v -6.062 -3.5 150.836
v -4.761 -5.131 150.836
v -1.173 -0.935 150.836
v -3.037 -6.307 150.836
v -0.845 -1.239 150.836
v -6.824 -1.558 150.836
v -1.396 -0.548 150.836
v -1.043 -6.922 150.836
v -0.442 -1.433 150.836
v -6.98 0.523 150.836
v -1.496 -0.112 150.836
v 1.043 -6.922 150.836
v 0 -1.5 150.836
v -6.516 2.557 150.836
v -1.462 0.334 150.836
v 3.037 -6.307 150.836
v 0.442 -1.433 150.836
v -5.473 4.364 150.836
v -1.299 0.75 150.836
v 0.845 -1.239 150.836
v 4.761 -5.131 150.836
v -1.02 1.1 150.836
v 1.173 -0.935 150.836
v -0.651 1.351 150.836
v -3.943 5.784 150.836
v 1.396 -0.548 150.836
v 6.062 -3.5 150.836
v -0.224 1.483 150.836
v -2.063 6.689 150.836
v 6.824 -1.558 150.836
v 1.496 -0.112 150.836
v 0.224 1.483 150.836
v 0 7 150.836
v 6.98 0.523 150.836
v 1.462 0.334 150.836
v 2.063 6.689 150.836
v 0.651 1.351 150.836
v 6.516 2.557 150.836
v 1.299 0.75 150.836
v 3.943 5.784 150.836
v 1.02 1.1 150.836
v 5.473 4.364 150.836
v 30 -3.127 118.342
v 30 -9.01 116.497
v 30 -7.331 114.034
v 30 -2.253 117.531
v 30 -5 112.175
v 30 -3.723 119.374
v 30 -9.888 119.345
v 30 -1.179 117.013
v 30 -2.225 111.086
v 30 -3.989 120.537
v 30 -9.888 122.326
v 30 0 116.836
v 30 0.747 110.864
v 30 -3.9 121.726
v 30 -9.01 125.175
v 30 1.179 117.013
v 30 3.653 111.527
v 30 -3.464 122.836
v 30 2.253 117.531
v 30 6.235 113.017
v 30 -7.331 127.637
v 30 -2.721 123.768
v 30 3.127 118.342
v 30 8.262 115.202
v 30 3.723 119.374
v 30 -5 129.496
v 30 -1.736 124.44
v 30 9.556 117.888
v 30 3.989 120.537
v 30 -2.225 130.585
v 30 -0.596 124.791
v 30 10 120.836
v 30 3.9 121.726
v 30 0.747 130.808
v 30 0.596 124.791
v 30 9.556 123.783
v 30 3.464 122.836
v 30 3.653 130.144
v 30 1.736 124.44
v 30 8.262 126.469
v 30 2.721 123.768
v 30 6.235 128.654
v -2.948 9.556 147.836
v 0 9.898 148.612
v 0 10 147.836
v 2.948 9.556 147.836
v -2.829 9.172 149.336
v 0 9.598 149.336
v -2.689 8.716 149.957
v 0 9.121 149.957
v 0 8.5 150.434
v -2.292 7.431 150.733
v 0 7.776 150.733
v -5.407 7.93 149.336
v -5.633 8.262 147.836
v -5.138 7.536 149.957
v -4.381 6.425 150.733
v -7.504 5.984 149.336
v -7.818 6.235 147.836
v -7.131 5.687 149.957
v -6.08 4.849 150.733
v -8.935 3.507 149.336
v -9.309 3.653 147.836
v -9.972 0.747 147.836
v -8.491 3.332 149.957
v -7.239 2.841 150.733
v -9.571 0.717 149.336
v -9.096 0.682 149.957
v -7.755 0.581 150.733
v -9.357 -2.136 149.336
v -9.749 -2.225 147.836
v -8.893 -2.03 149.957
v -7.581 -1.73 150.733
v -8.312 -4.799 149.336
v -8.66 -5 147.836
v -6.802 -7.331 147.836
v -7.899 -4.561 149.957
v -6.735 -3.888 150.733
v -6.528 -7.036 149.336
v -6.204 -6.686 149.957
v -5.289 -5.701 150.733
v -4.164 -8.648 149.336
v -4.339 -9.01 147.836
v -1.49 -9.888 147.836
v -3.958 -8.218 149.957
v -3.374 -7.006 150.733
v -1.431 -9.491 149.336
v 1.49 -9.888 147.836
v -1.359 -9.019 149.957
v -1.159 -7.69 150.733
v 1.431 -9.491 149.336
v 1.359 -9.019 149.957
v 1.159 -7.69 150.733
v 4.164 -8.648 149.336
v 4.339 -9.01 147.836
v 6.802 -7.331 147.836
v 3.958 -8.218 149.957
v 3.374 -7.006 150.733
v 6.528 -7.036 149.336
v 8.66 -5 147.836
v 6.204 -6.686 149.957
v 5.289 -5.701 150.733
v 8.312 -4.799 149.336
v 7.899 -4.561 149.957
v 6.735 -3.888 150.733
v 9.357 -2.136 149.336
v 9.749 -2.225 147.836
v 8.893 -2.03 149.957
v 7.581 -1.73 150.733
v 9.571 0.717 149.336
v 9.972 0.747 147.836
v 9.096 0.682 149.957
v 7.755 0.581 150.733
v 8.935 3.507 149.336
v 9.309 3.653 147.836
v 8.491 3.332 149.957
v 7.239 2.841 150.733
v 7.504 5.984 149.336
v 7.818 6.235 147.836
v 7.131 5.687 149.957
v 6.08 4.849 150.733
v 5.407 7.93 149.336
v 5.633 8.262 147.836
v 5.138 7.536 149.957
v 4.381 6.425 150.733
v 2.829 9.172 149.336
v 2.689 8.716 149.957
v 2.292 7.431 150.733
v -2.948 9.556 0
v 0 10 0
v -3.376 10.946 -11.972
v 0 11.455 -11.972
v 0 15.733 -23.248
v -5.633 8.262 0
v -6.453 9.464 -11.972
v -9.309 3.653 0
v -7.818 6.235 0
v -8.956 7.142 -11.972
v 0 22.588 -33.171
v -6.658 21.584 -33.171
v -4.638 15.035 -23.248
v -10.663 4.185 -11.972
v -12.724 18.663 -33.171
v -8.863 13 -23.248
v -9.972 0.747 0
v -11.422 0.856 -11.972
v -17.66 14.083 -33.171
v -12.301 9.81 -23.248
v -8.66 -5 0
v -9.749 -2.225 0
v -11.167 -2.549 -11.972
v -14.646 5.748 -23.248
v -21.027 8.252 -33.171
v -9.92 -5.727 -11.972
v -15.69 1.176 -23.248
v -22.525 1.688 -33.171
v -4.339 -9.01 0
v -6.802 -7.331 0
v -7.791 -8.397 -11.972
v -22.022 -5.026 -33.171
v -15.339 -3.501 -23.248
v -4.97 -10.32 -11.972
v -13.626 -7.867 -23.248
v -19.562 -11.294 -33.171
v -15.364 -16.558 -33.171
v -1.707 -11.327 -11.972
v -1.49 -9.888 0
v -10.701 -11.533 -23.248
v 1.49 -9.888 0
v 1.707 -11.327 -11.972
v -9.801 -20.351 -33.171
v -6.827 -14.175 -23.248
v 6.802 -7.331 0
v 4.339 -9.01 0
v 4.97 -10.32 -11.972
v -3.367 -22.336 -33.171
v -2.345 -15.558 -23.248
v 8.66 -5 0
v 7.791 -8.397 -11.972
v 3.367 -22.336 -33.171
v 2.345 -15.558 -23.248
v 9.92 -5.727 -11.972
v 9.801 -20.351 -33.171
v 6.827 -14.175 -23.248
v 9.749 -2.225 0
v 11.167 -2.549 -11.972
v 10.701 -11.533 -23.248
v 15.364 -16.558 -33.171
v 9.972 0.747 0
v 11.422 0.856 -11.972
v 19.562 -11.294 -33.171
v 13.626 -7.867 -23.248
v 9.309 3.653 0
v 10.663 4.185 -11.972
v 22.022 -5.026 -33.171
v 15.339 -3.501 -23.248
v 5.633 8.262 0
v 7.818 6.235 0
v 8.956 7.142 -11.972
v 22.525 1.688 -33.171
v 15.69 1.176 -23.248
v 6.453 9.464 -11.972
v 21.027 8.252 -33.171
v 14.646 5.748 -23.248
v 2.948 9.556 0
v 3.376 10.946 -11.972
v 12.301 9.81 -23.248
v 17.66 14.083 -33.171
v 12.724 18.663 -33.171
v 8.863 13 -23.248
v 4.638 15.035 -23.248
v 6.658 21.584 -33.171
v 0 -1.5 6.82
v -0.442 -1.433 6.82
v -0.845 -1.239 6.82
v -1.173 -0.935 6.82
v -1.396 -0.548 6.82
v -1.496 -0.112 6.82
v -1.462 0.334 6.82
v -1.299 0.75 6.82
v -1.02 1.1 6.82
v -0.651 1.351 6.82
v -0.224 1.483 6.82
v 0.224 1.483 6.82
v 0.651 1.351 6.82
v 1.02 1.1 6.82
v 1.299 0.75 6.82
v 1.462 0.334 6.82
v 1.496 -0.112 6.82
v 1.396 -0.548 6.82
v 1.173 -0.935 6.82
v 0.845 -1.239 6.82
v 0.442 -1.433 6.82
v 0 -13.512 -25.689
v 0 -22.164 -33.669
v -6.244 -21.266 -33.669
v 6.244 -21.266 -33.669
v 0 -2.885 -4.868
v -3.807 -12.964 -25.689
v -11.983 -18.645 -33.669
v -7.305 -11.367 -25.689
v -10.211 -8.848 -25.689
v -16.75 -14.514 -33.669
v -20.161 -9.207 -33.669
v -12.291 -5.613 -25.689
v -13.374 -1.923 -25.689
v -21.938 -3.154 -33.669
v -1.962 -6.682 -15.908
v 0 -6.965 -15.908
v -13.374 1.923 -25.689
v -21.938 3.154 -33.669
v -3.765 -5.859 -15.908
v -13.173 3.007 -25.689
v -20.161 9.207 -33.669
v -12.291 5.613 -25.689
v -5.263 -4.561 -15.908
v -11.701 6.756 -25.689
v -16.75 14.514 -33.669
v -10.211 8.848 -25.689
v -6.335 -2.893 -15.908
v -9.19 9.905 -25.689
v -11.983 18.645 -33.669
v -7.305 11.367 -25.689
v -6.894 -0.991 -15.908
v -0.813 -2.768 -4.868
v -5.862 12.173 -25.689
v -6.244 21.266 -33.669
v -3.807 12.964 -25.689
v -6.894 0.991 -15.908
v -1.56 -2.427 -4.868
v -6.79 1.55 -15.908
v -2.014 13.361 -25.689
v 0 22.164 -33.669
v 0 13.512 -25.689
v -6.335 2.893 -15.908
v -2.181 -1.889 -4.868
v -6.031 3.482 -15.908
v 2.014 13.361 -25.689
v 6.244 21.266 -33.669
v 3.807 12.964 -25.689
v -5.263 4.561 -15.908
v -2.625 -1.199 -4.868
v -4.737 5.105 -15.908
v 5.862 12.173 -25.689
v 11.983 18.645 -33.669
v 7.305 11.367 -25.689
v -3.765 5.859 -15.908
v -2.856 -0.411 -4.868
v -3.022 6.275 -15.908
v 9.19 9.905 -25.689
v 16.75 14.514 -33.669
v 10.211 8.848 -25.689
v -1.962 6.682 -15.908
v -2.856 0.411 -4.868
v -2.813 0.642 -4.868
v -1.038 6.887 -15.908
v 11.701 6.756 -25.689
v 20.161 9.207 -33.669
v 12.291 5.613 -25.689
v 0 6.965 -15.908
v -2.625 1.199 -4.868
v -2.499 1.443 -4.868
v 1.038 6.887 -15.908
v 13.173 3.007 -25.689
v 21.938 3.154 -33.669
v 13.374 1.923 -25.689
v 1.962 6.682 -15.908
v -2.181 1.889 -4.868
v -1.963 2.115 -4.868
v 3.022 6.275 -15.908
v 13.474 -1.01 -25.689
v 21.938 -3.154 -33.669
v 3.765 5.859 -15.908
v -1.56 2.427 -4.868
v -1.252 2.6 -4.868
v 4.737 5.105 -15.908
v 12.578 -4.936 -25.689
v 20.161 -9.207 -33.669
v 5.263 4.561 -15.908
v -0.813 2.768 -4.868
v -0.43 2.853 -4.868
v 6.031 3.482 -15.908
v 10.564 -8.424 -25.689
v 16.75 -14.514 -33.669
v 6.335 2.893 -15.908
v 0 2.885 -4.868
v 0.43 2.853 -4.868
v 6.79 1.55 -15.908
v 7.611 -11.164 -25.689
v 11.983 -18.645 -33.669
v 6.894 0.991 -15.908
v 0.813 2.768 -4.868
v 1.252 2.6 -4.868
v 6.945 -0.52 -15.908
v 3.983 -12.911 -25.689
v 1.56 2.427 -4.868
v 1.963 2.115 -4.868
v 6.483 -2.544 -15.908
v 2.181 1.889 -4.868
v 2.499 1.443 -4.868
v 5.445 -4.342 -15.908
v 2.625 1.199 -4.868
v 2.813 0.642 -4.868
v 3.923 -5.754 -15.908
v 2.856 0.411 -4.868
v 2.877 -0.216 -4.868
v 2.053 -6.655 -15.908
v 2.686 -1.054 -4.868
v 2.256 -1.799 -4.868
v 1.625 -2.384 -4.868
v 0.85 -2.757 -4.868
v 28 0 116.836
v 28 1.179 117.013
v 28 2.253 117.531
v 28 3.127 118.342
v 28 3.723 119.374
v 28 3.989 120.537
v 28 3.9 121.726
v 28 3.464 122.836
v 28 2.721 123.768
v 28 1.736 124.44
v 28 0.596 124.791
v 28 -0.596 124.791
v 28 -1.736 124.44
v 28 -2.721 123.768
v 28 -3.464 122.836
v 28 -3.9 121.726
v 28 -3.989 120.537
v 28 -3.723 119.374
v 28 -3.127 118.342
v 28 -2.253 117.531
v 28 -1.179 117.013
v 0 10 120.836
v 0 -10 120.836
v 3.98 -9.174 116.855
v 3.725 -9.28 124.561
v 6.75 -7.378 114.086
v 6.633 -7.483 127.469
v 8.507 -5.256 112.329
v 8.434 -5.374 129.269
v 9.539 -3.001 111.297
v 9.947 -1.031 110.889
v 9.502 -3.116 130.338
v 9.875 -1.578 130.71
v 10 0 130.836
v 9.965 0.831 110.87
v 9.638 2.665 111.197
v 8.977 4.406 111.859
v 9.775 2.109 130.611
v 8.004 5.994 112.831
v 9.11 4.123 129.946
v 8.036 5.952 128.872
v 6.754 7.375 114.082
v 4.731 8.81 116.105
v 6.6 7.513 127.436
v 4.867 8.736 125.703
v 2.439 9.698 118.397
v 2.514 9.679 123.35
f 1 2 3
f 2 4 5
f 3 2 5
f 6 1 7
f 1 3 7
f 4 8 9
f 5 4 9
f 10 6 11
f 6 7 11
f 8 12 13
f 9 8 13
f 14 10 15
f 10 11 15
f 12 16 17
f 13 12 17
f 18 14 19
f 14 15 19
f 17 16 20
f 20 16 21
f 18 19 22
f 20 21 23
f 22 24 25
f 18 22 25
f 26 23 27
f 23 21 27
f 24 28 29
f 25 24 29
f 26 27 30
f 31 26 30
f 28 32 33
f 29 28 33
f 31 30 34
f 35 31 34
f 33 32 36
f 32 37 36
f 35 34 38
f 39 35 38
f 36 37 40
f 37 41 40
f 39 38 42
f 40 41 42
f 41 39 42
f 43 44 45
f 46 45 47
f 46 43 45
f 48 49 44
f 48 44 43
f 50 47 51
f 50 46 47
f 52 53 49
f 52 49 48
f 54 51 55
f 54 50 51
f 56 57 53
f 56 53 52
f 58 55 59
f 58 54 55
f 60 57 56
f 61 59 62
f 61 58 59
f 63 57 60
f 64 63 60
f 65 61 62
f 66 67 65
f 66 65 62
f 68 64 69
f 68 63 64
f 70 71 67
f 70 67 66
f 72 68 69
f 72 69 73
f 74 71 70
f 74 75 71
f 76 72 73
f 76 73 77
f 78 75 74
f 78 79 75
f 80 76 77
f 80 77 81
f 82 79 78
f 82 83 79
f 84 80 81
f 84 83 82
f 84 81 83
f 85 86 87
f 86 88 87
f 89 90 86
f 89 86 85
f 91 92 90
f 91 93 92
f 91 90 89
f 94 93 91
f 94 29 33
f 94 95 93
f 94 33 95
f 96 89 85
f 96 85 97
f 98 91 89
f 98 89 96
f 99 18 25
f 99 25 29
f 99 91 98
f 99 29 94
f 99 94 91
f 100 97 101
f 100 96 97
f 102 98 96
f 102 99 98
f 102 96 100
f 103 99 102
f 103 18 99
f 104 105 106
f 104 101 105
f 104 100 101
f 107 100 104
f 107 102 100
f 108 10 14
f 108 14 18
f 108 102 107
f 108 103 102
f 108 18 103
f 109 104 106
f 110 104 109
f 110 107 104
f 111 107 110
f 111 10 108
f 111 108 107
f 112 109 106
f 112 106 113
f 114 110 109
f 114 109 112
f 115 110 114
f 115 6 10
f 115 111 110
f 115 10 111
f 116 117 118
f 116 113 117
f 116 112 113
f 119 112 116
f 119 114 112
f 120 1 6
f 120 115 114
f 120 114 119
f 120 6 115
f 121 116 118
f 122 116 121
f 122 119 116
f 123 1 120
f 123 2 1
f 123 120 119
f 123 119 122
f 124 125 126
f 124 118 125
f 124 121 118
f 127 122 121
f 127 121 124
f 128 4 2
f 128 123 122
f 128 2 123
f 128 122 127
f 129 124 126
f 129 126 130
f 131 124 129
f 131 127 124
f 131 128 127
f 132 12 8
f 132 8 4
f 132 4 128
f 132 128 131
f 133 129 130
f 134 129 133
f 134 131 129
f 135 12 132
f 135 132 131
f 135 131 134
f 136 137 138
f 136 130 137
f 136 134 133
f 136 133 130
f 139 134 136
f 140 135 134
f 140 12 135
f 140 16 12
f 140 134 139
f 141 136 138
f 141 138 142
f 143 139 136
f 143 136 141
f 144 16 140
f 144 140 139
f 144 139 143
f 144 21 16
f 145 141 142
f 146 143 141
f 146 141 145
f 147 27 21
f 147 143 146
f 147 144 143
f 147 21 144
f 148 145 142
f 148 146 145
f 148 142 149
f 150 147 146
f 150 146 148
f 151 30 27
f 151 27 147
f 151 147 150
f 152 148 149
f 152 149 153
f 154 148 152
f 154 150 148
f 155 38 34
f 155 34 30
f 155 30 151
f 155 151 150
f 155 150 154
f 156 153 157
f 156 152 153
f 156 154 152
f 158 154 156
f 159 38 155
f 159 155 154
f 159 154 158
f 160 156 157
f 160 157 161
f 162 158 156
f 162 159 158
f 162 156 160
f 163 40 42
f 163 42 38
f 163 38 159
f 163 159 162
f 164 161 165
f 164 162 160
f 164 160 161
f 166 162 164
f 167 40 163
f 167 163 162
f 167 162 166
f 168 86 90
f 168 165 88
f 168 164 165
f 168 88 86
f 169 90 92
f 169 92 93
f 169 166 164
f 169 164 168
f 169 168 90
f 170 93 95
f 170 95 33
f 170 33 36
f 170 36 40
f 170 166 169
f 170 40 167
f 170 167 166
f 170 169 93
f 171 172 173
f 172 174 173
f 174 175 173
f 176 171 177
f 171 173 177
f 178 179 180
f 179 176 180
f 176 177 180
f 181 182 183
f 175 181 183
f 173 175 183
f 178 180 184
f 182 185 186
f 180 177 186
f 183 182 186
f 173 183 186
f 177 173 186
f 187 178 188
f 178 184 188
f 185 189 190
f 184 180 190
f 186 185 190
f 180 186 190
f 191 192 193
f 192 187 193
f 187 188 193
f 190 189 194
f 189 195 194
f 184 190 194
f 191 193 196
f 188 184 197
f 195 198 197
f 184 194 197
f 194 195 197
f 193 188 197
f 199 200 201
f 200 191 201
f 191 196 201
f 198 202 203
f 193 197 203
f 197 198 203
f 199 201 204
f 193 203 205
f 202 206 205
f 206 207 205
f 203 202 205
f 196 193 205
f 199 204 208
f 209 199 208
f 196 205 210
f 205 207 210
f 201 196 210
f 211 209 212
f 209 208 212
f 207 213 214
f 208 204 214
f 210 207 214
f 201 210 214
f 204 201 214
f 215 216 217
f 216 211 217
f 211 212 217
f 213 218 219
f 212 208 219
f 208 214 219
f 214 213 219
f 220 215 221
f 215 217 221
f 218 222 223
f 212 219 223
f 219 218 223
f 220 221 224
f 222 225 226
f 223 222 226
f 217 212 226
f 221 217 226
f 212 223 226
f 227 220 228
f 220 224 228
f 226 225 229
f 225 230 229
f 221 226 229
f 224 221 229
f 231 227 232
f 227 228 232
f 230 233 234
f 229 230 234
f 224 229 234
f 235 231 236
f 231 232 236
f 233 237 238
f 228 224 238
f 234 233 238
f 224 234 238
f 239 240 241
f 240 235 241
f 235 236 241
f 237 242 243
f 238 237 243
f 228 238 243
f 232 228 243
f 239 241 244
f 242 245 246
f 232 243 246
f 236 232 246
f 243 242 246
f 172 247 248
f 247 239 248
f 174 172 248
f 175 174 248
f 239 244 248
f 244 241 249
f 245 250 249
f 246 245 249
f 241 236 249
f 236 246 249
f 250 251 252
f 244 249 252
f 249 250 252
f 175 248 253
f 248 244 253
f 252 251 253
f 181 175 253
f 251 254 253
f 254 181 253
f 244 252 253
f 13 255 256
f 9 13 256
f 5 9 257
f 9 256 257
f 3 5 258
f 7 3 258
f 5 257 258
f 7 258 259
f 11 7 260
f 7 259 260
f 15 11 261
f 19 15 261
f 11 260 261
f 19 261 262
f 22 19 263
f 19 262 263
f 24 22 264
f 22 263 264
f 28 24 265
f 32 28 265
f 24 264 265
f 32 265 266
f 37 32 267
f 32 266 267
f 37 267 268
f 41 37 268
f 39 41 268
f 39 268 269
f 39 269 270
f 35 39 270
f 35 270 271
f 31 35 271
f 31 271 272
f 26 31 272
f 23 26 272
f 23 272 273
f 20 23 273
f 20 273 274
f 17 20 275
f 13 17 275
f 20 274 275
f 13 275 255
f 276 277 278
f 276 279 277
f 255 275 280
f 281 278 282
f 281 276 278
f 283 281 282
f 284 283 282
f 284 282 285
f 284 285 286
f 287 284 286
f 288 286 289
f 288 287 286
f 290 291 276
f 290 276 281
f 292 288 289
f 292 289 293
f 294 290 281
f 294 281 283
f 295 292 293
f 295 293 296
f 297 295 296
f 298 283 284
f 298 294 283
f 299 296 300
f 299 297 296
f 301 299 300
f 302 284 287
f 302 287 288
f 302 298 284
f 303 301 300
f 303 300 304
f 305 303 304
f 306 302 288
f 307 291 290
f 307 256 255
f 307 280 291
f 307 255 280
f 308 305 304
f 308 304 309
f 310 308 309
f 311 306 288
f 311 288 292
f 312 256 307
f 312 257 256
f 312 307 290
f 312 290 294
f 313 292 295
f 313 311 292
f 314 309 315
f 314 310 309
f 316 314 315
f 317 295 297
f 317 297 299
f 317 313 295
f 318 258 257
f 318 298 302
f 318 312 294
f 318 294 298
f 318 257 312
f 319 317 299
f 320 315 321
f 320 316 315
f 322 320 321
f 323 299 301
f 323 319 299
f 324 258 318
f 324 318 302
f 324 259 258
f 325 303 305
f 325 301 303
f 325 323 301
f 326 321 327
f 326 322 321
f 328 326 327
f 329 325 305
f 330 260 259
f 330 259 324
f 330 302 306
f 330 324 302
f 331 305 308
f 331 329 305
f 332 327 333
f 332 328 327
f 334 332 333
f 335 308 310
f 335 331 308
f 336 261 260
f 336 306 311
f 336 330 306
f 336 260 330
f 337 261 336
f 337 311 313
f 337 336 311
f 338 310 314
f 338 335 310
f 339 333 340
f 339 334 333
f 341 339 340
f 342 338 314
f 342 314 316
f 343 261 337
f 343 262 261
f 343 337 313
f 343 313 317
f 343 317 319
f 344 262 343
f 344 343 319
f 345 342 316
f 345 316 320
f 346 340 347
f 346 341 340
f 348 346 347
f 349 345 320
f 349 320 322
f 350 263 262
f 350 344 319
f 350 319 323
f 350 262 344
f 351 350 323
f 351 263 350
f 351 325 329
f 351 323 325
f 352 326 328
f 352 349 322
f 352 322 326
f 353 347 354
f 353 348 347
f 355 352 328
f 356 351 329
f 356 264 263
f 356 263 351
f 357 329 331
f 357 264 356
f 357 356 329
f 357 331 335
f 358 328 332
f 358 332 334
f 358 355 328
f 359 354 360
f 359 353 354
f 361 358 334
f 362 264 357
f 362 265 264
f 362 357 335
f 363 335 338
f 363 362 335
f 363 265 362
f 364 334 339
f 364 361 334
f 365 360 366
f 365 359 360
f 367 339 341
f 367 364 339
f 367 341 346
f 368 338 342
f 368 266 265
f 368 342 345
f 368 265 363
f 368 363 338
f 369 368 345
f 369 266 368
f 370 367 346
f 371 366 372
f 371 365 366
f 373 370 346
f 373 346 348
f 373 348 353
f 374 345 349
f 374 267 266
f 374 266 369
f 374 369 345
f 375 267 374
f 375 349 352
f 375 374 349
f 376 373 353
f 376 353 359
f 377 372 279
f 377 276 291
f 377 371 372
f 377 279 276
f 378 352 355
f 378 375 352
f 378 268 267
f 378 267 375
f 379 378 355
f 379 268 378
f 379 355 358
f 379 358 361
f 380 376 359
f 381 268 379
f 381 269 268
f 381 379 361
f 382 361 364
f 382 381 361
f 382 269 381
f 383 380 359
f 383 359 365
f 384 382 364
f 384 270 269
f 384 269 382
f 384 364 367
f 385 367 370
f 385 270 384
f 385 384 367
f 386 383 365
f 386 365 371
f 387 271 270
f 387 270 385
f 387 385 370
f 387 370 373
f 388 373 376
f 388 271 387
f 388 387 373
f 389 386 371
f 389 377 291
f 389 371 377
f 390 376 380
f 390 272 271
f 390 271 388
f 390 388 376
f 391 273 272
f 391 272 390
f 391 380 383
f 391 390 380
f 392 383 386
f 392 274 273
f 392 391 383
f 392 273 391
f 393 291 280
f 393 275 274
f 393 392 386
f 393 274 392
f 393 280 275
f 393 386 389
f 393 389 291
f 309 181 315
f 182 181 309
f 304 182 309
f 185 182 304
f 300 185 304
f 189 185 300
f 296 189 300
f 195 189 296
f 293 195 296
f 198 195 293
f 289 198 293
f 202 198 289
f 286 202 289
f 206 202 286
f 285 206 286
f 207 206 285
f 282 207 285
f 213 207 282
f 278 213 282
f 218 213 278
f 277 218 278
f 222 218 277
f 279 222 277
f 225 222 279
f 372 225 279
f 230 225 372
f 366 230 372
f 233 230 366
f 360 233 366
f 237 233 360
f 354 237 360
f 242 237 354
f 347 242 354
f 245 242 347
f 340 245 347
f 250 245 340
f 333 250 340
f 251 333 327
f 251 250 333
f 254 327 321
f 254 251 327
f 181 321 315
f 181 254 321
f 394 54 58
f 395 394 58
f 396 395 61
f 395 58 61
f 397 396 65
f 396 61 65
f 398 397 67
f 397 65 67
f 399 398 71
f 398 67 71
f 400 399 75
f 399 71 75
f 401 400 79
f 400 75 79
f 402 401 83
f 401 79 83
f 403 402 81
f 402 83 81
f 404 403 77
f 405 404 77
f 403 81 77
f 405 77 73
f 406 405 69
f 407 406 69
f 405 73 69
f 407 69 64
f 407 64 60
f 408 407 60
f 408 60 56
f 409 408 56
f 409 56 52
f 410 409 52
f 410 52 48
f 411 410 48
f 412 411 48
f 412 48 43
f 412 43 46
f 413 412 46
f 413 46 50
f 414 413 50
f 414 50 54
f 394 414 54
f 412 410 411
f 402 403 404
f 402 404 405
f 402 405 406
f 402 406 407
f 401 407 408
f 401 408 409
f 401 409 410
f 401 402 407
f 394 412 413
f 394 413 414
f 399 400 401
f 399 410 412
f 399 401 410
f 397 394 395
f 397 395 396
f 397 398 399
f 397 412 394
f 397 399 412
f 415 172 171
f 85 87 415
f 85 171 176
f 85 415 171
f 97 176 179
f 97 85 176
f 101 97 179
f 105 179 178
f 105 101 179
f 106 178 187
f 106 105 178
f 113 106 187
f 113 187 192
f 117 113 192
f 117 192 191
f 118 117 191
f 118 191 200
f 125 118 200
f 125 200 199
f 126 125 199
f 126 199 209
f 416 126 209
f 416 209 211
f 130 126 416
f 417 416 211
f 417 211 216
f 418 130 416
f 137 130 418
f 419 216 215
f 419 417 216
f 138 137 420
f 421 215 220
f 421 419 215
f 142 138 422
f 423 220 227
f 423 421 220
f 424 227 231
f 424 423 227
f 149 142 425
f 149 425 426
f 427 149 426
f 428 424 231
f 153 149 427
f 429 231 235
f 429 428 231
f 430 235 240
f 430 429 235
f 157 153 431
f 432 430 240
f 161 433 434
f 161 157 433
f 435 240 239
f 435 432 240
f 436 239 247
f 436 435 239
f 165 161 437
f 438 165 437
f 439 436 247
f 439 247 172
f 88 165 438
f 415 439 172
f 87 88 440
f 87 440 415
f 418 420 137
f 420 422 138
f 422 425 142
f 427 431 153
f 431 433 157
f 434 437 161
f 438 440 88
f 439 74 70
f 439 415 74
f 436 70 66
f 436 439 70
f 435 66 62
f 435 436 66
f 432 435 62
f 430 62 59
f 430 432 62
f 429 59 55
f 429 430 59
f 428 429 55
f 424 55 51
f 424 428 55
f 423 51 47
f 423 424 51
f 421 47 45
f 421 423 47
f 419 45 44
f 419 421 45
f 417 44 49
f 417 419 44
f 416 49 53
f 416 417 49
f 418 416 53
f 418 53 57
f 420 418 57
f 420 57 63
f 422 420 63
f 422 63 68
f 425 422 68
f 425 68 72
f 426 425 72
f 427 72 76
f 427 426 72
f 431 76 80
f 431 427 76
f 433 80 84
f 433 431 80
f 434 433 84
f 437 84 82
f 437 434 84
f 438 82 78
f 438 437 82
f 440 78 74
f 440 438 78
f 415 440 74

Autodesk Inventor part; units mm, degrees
ref_plane "YZ Plane" through (0, 0, 0) normal (1, 0, 0) x (0, 1, 0)
ref_plane "XZ Plane" through (0, 0, 0) normal (0, 1, 0) x (-1, 0, 0)
ref_plane "XY Plane" through (0, 0, 0) normal (0, 0, 1) x (1, 0, 0)
sketch "Sketch1" plane through (0, 0, 0) normal (1, 0, 0) x (0, 1, 0)
  line L0 (10, 0) -> (10, 150.8357)
  arc A0 (10, 0) -> (24.6447, -35.3553) centre (60, 0) ccw
  line L1 (10, 0) -> (60, 0) construction
  line L2 (24.6447, -35.3553) -> (60, 0) construction
  line L3 (24.6447, -35.3553) -> (0, -35.3553)
  line L4 (10, 150.8357) -> (0, 150.8357)
  line L5 (0, 150.8357) -> (0, -35.3553)
  circle A1 centre (0, 120.8357) radius 10
  point P0 (0, 0)
  dimension "d5" = 50
  dimension "d6" = 45
  dimension "d21" = 20
  dimension "d22" = 30
revolve "Revolution1" add sketch "Sketch1" angle 360 about axis through (0, 0, 150.8357) along (0, 0, -1) picked at (3.0032, 122.282) contours A0 L3 L5 A1 L0 | A1 L5 L4 L0 | A1 L5
fillet "Fillet1" radius 3 1 edges at (0, -10, 150.8357)
sketch "Sketch2" plane through (0, 0, 150.8357) normal (0, 0, 1) x (1, 0, 0)
  point P0 (0, 0)
  point P1 (0, 0)
hole "Hole1" at (0, 0, 150.8357) direction (0, 0, -1) diameter 3 end through all
fillet "Fillet2" radius 50 1 edges at (0, 1.5, -35.3553)
chamfer "Chamfer1" distance 3 angle 45 2 edges at (-24.6447, 0, -35.3553) (24.6447, 0, -35.3553)
ref_plane "Work Plane2" through (0, 10, 0) normal (-1, 0, 0) x (0, 0, 1)
ref_plane "Work Plane1" through (0, 10, 150.8357) normal (0, 1, 0) x (-1, 0, 0)
extrude "Extrusion1" add sketch "Sketch1" along normal blind 30 contours A1 L5 | L5 A1
sketch "Sketch3" plane through (0, 0, 150.8357) normal (0, 0, 1) x (1, 0, 0)
  point P0 (0, 0)
  point P1 (0, 0)
hole "Hole2" at (0, 0, 150.8357) direction (0, 0, -1) diameter 3 end through all
sketch "Sketch5" plane through (30, 0, 120.8357) normal (1, 0, 0) x (0, 0, -1)
  point P0 (120.8357, 0)
  point P1 (0.0315, -0.0065)
sketch "Sketch6" plane through (30, 0, 120.8357) normal (1, 0, 0) x (0, 0, -1)
  point P0 (120.8357, 0)
ref_plane "Work Plane3" through (30, 0, 120.8357) normal (1, 0, 0) x (0, 0, -1)
sketch "Sketch9" plane through (30, 0, 120.8357) normal (1, 0, 0) x (0, 0, -1)
  circle A0 centre (0, 0) radius 4
  point P0 (120.8357, 0)
  dimension "d40" = 8
extrude "Extrusion2" cut sketch "Sketch9" against normal blind 2
equation "\"d5\" = Rbend"
equation "\"d21\" = mainDiameter"
equation "\"d22\" = magnetPosition"
equation "\"d23\" = magnetPosition"
equation "\"d30\" = Thickness"
equation "\"d40\" = magnetDiamter"
equation "\"d41\" = magnetHeight"
equation "\"mainDiameter\" = 20"
equation "\"channelDiameter\" = 1"
equation "\"Rbend\" = 50"
equation "\"BendRadius\" = Thickness"
equation "\"BendReliefWidth\" = Thickness"
equation "\"BendReliefDepth\" = 0.5 * Thickness"
equation "\"CornerReliefSize\" = 4 * Thickness"
equation "\"MinimumRemnant\" = 2 * Thickness"
equation "\"TransitionRadius\" = BendRadius"
equation "\"JacobiRadiusSize\" = BendRadius"
equation "\"GapSize\" = Thickness"
equation "\"magnetPosition\" = 30"
equation "\"magnetDiamter\" = 8"
equation "\"magnetHeight\" = 2"
equation "\"Thickness\" = 3.048"
properties part number "fiberHolder2"
